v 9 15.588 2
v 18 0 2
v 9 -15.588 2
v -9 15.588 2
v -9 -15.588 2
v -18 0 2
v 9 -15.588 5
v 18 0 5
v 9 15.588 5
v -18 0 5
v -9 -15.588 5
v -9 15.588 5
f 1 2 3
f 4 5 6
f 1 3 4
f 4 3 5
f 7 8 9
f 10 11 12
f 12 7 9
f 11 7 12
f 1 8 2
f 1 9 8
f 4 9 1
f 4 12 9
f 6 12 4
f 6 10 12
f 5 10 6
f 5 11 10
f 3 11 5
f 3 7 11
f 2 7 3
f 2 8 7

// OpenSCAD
// Paramètres
diametre_medaille = 70;
epaisseur_medaille = 5;
nb_facettes = 34;

diametre_hexagone = 36;
epaisseur_hexagone = 3;
prof_facette = 3; // Profondeur du "creux" (le centre des facettes est plus bas)

// Fonction pour interpolation linéaire
function lerp(a,b,t) = a + (b-a)*t;

// Motif facetté (facettes inclinées du bord au centre)
module facettes_soleil_incline() {
    for (i = [0 : nb_facettes-1]) {
        angle1 = 360/nb_facettes * i;
        angle2 = 360/nb_facettes * (i+1);
        h_centre = epaisseur_medaille-prof_facette;
        h_bord   = epaisseur_medaille;
        
        // Chaque facette = trapèze 3D, épais au bord, creusé au centre
        poly = [  
            [0, 0, h_centre],
            [cos(angle1)*diametre_medaille/2, sin(angle1)*diametre_medaille/2, h_bord],
            [cos(angle2)*diametre_medaille/2, sin(angle2)*diametre_medaille/2, h_bord]
        ];

        // Génère un prisme triangulaire 3D pour chaque facette
        polyhedron(
            points=[
                [0, 0, 0], // centre base
                [3+cos(angle1)*diametre_medaille/2, 2+sin(angle1)*diametre_medaille/2, 0], // bord base 1
                [cos(angle2)*diametre_medaille/2, sin(angle2)*diametre_medaille/2, 0], // bord base 2

                [0, 0, h_centre], // sommet centre haut
                [cos(angle1)*diametre_medaille/2, sin(angle1)*diametre_medaille/2, h_bord], // sommet bord 1
                [cos(angle2)*diametre_medaille/2, sin(angle2)*diametre_medaille/2, h_bord] // sommet bord 2
            ],
            faces=[
                [0, 1, 2],    // base dessous
                [3, 4, 5],    // dessus
                [0, 1, 4, 3], // flanc 1
                [1, 2, 5, 4], // flanc 2
                [2, 0, 3, 5]  // flanc 3
            ]
        );
    }
}

// Hexagone central en relief
module hexagone() {
    translate([0,0,epaisseur_medaille-epaisseur_hexagone])
        linear_extrude(height=epaisseur_hexagone)
            polygon(points=[
                for(i=[0:5])
                    [cos(60*i)*diametre_hexagone/2, sin(60*i)*diametre_hexagone/2]
            ]);
}

// Médaille complète
module medaille() {
    color("gold")
    facettes_soleil_incline();  // Effet soleil en relief
    color("gray")
    hexagone();                 // Hexagone central
}

medaille();
